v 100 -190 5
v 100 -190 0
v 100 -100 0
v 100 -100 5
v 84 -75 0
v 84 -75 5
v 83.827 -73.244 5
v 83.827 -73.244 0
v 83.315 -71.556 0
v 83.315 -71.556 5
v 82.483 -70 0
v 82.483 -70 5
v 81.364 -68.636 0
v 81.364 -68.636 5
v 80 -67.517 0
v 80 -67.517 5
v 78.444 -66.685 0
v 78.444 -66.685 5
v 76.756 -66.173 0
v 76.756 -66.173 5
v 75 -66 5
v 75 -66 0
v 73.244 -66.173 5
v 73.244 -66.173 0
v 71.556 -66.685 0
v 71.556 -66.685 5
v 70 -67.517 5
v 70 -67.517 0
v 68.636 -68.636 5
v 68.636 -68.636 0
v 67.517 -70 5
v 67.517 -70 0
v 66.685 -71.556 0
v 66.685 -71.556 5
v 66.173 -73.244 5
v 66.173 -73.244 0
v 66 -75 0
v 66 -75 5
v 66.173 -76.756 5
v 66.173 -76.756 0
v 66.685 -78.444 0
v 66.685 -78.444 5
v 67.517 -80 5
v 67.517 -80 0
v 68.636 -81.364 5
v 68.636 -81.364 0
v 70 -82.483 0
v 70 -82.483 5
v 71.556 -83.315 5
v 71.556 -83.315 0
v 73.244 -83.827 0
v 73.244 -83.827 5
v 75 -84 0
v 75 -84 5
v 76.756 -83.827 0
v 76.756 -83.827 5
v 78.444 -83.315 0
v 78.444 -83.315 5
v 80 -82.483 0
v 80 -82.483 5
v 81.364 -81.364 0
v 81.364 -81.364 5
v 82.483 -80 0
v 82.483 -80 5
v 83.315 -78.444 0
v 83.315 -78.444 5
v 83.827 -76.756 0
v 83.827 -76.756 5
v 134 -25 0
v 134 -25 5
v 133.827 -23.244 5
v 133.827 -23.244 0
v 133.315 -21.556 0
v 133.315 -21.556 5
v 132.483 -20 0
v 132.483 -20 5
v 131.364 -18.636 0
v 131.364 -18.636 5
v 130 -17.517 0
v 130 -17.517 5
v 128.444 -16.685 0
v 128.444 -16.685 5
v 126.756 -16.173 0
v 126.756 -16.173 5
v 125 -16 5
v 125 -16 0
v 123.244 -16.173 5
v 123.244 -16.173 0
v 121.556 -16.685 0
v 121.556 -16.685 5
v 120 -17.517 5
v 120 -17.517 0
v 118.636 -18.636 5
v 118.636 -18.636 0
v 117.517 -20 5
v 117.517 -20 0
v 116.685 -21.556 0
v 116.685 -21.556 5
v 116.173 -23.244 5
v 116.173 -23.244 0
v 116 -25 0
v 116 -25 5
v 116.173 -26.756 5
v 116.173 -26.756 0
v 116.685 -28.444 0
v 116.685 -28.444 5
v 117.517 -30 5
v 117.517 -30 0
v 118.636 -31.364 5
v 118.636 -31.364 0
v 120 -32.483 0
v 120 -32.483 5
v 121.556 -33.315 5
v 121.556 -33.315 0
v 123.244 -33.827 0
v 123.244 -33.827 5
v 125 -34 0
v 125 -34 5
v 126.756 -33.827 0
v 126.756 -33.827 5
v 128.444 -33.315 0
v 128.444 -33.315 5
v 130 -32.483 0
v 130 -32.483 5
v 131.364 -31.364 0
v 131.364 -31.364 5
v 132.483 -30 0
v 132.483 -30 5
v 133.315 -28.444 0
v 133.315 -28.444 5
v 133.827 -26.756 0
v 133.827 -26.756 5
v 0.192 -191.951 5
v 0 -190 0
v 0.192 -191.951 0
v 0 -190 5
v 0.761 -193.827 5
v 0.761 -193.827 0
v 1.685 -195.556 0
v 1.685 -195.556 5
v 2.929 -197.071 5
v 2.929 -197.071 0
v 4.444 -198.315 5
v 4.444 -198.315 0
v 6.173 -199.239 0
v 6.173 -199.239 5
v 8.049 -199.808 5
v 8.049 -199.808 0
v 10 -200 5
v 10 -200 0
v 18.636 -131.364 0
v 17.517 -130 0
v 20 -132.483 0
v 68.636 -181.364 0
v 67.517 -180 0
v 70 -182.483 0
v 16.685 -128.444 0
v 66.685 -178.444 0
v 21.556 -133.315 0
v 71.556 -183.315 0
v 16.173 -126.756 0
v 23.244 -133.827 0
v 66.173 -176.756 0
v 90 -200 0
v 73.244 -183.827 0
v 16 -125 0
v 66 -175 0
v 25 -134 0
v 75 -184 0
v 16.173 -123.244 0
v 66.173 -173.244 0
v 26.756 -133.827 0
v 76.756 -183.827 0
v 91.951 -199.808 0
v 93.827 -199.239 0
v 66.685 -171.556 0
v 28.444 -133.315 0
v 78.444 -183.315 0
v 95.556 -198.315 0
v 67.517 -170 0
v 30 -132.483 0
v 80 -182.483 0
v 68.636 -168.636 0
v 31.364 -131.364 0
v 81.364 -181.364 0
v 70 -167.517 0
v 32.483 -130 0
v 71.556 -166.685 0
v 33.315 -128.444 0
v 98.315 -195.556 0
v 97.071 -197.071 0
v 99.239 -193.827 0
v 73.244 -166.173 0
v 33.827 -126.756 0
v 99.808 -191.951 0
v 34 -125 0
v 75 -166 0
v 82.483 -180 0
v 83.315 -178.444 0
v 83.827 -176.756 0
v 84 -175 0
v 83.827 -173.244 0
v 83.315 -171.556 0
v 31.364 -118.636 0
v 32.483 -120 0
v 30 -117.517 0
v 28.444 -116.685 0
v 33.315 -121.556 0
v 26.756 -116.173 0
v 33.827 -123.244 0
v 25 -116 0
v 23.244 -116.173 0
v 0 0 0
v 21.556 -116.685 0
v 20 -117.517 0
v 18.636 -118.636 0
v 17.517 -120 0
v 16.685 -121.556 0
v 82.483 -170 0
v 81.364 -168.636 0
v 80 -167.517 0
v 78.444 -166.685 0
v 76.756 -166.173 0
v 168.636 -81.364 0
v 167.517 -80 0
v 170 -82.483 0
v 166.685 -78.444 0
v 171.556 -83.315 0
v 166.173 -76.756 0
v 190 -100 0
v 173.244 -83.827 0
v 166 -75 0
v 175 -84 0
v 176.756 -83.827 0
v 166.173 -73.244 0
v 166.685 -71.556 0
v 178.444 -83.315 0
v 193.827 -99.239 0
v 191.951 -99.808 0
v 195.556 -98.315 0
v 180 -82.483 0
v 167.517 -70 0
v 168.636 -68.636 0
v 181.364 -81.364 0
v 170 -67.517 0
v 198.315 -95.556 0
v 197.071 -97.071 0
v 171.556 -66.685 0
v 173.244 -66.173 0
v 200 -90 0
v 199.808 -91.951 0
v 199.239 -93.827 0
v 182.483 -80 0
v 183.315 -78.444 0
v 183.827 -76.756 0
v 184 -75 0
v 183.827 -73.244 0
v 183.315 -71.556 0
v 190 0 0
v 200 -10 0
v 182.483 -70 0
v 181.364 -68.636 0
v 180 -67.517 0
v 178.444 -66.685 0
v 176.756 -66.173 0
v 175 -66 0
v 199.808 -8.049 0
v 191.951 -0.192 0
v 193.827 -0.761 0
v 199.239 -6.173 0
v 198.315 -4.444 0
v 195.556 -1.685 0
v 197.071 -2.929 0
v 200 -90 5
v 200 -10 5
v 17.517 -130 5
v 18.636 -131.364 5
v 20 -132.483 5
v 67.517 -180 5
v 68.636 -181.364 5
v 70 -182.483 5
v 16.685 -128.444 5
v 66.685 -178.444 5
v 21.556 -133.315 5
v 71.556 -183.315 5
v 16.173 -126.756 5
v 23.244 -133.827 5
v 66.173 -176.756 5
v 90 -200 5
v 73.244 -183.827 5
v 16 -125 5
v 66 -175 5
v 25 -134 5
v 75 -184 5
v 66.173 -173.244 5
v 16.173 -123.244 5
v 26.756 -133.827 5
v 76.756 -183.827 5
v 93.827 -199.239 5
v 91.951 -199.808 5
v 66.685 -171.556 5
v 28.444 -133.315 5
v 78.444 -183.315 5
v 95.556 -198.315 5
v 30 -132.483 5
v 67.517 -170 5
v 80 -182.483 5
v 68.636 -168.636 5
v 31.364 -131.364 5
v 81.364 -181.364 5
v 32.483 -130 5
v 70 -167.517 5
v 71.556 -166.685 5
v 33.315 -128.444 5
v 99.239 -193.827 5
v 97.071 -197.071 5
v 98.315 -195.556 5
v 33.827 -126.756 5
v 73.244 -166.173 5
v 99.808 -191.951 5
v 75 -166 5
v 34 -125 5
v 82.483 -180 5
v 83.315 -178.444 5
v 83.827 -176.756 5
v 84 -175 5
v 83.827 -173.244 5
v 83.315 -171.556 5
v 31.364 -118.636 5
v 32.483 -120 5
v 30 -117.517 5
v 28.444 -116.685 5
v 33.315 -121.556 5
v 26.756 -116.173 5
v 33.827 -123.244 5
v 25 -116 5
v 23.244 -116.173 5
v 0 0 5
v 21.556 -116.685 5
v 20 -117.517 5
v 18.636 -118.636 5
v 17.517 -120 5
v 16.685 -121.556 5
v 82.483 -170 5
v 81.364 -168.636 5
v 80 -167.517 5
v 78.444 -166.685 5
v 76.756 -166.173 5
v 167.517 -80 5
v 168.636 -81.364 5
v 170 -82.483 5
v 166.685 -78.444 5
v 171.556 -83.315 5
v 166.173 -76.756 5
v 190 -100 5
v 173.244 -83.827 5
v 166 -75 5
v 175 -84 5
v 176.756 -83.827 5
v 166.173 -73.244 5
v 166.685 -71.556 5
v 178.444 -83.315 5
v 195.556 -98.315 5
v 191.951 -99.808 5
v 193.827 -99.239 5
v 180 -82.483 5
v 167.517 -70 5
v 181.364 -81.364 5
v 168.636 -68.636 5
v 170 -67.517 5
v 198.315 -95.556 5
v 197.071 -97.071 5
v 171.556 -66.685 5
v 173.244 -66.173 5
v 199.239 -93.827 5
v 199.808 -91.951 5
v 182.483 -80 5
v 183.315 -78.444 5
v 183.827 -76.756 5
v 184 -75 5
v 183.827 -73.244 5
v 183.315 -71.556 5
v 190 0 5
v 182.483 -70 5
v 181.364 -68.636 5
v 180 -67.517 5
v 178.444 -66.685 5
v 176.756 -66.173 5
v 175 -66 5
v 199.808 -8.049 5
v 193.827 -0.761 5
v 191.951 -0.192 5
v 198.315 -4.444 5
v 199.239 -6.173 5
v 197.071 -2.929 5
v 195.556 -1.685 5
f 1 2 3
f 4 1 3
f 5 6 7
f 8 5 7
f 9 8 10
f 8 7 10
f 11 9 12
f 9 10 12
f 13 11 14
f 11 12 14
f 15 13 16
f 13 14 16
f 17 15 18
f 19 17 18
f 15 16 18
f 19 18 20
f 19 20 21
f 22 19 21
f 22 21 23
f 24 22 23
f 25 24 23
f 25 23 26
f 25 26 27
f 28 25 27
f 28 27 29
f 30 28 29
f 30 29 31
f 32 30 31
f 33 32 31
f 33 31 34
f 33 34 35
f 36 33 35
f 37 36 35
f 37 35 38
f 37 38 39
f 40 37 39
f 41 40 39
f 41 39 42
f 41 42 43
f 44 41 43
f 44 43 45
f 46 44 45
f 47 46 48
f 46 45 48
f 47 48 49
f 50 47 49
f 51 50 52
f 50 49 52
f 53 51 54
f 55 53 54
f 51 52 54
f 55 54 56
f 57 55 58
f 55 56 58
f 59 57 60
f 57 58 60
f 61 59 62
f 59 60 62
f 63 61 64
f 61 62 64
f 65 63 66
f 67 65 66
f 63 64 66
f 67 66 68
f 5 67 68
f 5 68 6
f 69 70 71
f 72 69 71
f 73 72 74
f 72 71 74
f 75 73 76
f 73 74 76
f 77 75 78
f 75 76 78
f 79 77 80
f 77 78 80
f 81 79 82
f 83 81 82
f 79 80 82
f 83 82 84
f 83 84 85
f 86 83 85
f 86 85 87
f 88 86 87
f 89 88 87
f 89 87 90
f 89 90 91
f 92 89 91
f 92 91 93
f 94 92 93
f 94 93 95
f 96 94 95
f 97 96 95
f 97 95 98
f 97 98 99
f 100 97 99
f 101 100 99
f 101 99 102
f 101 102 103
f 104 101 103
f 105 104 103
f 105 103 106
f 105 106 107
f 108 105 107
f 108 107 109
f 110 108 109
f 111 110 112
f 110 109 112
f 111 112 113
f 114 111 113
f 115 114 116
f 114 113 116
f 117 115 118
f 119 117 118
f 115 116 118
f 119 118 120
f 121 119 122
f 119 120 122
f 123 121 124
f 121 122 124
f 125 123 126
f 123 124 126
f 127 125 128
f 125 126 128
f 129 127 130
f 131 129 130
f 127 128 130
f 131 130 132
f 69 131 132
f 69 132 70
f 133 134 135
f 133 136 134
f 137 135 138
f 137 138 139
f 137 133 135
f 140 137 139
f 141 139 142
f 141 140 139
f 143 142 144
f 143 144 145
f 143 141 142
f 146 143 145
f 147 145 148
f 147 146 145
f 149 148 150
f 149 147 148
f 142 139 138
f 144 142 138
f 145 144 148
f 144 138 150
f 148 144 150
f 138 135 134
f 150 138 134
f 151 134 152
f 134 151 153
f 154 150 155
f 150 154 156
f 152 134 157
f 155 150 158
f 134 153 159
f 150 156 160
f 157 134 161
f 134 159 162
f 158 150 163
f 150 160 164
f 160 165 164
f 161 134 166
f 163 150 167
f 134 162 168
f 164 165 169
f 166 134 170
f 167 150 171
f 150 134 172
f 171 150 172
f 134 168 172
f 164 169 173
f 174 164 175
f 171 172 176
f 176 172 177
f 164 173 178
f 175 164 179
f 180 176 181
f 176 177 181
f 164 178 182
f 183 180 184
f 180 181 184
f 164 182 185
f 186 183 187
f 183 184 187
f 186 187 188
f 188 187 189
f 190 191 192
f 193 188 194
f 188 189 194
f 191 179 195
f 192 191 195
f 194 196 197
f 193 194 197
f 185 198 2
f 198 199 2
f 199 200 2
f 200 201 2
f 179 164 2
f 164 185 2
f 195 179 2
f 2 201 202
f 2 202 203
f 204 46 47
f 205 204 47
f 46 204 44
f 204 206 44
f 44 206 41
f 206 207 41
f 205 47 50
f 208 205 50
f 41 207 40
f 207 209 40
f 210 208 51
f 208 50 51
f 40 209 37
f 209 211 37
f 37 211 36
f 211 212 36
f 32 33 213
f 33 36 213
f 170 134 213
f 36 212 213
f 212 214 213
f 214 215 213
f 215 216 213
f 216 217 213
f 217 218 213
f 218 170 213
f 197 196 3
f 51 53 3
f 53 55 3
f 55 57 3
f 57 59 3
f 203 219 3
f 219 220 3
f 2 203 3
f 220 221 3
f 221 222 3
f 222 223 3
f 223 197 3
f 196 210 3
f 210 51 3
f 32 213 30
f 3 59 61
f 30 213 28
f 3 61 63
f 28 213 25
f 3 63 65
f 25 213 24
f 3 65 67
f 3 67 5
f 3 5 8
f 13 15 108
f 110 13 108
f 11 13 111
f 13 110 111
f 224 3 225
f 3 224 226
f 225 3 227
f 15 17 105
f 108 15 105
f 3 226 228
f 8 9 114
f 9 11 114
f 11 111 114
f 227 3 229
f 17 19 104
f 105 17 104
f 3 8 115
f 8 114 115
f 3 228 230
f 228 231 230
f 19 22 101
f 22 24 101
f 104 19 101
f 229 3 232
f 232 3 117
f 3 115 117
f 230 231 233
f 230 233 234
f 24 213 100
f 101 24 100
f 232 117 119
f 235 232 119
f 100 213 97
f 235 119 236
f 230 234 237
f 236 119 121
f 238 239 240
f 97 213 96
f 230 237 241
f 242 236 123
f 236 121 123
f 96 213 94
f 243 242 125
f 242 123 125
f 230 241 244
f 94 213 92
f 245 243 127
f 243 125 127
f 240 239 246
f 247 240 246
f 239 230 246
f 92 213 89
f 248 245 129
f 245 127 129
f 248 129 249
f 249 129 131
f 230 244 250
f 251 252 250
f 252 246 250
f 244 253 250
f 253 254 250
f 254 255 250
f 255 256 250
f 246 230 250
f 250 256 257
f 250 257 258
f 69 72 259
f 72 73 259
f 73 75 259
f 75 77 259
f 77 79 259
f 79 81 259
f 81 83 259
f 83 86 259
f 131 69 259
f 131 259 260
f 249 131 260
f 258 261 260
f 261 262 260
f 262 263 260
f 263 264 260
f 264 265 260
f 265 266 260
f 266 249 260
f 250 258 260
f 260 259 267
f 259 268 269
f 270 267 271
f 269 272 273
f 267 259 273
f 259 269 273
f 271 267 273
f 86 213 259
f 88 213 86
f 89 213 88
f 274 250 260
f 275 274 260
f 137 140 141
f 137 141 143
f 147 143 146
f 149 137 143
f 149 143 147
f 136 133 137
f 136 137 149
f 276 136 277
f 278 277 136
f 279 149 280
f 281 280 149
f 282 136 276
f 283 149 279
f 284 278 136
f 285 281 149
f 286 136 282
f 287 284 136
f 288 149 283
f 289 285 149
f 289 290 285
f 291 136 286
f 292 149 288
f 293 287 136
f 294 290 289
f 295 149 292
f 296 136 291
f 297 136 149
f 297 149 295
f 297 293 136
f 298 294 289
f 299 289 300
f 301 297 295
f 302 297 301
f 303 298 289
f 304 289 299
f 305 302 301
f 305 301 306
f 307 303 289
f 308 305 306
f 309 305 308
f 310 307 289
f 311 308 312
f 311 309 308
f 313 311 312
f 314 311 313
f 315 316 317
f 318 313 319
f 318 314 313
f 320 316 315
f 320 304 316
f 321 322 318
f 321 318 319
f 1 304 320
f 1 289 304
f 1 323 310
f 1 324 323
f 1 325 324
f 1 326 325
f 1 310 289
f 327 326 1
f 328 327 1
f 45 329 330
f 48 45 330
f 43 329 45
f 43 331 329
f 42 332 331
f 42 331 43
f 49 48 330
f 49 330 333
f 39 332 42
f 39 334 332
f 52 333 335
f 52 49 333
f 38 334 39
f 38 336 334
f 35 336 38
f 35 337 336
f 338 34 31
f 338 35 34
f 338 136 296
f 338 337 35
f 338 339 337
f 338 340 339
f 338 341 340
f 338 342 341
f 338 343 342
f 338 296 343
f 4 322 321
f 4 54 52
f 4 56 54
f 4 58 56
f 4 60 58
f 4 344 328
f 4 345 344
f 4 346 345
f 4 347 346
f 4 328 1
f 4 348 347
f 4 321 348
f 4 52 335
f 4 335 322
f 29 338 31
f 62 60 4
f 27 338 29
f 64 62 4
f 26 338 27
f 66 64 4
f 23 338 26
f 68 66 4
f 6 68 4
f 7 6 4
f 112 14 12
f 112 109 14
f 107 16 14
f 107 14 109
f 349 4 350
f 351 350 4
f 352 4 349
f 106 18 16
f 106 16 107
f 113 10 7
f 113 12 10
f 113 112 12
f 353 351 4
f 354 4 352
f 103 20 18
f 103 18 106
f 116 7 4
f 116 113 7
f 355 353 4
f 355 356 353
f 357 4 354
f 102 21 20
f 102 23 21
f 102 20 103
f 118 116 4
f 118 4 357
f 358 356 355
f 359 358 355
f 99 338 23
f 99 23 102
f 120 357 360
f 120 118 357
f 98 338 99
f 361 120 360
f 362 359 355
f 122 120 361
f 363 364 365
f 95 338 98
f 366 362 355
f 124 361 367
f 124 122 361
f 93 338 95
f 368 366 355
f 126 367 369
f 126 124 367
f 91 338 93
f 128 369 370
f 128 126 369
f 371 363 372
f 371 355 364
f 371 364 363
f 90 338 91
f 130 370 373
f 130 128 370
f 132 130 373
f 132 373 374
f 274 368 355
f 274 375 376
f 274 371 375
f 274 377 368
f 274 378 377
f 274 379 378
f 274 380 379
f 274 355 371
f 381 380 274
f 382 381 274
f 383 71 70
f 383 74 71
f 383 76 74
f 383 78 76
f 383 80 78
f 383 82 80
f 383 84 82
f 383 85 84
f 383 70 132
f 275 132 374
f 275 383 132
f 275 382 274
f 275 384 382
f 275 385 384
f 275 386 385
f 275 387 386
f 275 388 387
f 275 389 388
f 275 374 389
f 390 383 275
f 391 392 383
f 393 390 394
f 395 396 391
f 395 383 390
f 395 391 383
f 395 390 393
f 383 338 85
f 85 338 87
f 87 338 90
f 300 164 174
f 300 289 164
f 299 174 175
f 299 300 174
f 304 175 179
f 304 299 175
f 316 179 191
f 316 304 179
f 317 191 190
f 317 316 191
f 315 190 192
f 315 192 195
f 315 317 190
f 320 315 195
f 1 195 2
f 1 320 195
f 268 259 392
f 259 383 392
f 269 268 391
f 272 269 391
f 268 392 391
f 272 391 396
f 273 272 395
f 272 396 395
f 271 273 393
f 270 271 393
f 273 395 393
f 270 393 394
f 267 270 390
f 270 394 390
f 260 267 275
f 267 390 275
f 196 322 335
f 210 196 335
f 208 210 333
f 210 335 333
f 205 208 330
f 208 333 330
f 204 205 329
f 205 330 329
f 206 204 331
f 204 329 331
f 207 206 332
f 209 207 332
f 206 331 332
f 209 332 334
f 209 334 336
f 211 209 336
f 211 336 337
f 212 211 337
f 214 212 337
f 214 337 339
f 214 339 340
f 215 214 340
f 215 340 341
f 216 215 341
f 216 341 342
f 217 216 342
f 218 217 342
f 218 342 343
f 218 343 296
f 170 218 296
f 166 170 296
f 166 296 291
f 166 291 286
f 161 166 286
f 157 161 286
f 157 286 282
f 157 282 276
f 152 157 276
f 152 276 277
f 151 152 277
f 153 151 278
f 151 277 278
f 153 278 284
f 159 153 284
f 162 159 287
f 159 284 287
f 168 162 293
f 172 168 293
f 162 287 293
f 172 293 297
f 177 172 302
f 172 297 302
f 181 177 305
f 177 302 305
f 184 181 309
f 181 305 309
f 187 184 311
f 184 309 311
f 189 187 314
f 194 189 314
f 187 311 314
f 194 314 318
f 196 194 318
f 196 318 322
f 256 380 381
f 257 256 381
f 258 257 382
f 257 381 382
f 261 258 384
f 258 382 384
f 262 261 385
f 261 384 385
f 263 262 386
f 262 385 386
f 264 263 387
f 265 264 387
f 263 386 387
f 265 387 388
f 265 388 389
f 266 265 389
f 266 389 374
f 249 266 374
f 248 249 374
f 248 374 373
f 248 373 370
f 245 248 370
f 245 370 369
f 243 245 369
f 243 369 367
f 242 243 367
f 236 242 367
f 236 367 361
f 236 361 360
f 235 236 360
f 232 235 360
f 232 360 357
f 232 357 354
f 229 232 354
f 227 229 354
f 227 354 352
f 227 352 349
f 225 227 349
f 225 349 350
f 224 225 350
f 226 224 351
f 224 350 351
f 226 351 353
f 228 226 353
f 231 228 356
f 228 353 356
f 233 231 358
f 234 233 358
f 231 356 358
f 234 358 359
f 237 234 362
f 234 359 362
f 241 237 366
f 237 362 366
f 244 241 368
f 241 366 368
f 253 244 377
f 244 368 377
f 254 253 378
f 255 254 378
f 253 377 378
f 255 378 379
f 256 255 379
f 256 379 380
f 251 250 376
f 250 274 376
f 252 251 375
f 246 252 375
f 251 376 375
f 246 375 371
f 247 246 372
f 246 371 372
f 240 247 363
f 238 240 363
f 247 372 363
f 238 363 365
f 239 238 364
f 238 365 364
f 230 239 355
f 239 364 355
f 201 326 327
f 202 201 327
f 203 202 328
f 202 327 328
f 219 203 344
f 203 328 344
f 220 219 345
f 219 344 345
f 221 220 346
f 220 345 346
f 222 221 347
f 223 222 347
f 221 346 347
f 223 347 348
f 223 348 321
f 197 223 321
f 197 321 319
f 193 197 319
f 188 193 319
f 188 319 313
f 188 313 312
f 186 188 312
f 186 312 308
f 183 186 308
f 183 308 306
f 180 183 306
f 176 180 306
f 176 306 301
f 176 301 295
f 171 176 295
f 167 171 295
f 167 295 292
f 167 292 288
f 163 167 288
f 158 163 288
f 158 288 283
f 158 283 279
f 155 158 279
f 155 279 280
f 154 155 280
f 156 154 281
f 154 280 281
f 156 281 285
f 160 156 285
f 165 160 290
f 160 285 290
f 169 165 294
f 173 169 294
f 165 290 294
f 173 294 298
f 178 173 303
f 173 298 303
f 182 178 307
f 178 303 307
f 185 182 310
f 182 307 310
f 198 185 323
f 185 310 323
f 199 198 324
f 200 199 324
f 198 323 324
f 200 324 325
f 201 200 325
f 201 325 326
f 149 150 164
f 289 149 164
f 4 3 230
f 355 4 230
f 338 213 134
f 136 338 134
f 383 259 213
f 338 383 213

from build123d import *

# Parameters (mm, degrees)
F1_DEPTH = 5
F2_R     = 9
F3_DEPTH = 25
F4_R     = 10


with BuildPart() as f1:
    # F0 (on Top) → F1 (new body)
    with BuildSketch(Plane.XY):
        Polygon((200, 0), (0, 0), (0, -200), (100, -200), (100, -100), (200, -100), align=None)
    extrude(amount=F1_DEPTH)

    # F2 (on face) → F3 (cut)
    with BuildSketch(Plane.XY.offset(5)):
        with Locations((175.000086, -74.999993)):
            Circle(F2_R)
        with Locations((125.000086, -24.999993)):
            Circle(F2_R)
        with Locations((75.000086, -74.999993)):
            Circle(F2_R)
        with Locations((75.000086, -174.999993)):
            Circle(F2_R)
        with Locations((25.000086, -124.999993)):
            Circle(F2_R)
    extrude(amount=-F3_DEPTH, mode=Mode.SUBTRACT)

    # F4
    f4_edges = [f1.edges().sort_by_distance(p)[0] for p in [
        (0, -200, 2.5),
        (100, -200, 2.5),
        (200, -100, 2.5),
        (200, 0, 2.5),
    ]]
    fillet(f4_edges, radius=F4_R)


solid = f1.part
